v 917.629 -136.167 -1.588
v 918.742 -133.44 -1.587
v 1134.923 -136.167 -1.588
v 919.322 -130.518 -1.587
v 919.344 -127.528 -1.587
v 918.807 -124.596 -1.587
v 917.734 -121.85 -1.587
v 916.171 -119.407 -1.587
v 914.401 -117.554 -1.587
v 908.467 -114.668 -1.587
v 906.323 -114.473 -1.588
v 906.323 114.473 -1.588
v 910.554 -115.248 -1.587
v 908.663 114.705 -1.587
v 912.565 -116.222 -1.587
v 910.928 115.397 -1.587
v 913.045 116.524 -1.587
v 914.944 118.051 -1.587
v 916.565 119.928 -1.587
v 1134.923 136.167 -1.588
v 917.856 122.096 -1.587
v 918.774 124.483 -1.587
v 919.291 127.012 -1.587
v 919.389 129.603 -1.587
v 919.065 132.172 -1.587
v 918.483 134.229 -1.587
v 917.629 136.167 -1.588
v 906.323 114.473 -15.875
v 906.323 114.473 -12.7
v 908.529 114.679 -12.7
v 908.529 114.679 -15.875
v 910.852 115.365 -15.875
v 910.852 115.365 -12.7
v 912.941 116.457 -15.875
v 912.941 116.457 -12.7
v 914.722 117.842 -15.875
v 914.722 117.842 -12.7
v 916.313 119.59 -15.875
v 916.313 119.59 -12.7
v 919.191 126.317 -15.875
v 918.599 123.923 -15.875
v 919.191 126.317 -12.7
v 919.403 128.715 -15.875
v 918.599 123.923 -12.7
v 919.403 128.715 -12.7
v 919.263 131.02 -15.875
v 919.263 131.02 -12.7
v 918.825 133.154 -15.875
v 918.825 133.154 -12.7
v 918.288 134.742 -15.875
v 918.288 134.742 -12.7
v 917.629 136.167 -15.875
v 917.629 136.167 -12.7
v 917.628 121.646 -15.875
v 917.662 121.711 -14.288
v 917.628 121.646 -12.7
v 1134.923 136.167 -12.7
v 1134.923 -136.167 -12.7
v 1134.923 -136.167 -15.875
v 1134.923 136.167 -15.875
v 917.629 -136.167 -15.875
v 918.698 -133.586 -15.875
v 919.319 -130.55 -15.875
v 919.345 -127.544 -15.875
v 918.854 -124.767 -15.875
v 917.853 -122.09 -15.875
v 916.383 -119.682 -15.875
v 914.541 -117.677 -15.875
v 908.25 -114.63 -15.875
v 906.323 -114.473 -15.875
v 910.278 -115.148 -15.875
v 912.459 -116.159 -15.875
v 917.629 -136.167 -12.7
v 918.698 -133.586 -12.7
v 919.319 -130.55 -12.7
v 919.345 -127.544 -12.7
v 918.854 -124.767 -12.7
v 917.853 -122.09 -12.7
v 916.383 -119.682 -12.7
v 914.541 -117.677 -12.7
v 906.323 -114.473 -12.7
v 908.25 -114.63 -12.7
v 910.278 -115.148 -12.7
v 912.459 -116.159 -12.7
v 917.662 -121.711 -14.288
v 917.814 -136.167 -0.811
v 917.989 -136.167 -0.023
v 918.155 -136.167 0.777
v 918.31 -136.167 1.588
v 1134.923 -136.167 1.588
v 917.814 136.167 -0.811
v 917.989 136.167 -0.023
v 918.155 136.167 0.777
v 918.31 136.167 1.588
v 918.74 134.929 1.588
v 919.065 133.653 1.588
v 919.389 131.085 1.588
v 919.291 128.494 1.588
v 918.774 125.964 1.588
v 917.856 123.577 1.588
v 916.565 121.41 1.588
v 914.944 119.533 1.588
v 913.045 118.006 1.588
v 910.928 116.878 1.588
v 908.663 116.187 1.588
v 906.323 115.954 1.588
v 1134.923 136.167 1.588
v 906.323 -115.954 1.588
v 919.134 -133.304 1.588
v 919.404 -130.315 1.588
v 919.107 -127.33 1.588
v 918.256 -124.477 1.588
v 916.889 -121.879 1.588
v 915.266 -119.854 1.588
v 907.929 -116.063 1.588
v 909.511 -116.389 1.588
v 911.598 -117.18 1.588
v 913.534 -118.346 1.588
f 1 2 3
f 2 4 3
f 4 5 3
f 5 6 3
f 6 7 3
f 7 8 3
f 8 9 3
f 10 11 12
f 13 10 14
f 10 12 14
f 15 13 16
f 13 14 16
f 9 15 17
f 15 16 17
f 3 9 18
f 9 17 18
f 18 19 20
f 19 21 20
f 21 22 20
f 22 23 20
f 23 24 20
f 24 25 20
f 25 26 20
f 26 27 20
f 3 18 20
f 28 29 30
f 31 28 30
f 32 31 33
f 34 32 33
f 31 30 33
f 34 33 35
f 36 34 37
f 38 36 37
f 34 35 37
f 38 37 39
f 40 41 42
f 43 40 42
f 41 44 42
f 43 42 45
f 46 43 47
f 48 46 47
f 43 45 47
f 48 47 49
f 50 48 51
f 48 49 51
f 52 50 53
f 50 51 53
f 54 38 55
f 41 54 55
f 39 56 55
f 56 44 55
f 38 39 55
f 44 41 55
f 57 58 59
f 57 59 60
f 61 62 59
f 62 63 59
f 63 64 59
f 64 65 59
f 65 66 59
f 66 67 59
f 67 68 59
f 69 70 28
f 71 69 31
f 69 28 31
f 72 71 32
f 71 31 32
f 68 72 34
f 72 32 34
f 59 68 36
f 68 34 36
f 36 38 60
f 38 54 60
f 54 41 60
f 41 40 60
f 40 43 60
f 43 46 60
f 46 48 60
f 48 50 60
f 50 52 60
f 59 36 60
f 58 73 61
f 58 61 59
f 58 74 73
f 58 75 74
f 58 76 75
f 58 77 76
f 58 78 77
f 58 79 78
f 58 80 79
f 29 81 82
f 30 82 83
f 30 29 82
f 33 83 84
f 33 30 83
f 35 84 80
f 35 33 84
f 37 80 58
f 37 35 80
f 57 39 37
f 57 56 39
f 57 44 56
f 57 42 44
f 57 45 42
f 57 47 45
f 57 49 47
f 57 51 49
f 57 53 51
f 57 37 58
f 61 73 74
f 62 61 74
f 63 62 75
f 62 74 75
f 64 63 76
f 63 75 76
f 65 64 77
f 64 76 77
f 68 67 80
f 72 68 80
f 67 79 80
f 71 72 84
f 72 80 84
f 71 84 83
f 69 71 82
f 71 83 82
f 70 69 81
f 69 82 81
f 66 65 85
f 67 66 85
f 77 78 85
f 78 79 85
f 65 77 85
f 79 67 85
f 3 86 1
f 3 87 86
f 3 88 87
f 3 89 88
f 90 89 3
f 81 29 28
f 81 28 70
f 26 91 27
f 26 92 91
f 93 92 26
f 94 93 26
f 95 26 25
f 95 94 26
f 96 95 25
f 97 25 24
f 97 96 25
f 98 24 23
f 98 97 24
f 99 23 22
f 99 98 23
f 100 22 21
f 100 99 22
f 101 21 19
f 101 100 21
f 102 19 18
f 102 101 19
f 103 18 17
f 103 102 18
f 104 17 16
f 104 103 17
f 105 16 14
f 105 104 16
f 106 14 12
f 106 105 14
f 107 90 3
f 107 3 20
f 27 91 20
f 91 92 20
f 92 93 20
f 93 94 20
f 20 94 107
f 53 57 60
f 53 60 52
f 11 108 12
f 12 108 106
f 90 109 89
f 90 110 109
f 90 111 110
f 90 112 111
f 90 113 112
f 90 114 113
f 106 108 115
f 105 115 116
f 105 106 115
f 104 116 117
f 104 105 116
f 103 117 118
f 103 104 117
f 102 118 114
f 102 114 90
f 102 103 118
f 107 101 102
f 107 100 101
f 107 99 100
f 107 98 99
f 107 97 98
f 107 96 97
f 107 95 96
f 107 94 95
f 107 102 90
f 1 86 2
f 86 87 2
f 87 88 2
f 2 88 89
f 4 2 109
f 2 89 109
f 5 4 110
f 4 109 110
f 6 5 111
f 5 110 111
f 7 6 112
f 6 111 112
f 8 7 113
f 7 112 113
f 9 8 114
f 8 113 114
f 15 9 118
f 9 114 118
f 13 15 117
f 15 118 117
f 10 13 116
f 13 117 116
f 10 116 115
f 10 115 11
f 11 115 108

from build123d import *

# Parameters (mm, degrees)
SKETCH2_W           = 228.6
SKETCH2_H           = 272.333207428
BOSS_EXTRUDE2_DEPTH = 1.5875
SKETCH4_R           = 13.081
CUT_EXTRUDE2_DEPTH  = 356.900789089
BOSS_EXTRUDE3_DEPTH = 3.175


with BuildPart() as part:
    # Sketch2 → Boss-Extrude2 (new, symmetric)
    with BuildSketch(Plane.XY):
        with Locations((1020.6228, 0)):
            Rectangle(SKETCH2_W, SKETCH2_H)
    extrude(amount=BOSS_EXTRUDE2_DEPTH, both=True)

    # Sketch4 → Cut-Extrude2 (cut, through all)
    with BuildSketch(Plane(origin=(906.3228, 136.166603714, 13.97), x_dir=(-1, 0, 0), z_dir=(-8.741913579725579e-15, -0.4228367232518726, -0.9062058847025986))):
        Circle(SKETCH4_R)
    cut_extrude2 = extrude(amount=CUT_EXTRUDE2_DEPTH, mode=Mode.SUBTRACT)

    # Mirror2: Cut-Extrude2 across plane
    add(cut_extrude2.mirror(Plane.ZX), mode=Mode.SUBTRACT)


with BuildPart() as body_2:
    # Sketch5 → Boss-Extrude3 (new body)
    with BuildSketch(Plane.XY.offset(-12.7)):
        with BuildLine():
            Line((906.3228, 114.472546487), (906.3228, -114.472546487))
            add(Edge.make_bspline(
                [(917.629380504, -136.166603714), (929.067348802, -114.472546487), (906.3228, -114.472546487)],
                knots=[1.043859165, 1.043859165, 1.043859165, 3.141592654, 3.141592654, 3.141592654], degree=2, weights=[1, 0.49855374, 1]))
            Line((917.629380504, -136.166603714), (1134.9228, -136.166603714))
            Line((1134.9228, -136.166603714), (1134.9228, 136.166603714))
            Line((1134.9228, 136.166603714), (917.629380504, 136.166603714))
            add(Edge.make_bspline(
                [(906.3228, 114.472546487), (929.067348802, 114.472546487), (917.629380504, 136.166603714)],
                knots=[3.141592654, 3.141592654, 3.141592654, 5.239326142, 5.239326142, 5.239326142], degree=2, weights=[1, 0.49855374, 1]))
        make_face()
    extrude(amount=-BOSS_EXTRUDE3_DEPTH)


solid = Compound([part.part, body_2.part])
